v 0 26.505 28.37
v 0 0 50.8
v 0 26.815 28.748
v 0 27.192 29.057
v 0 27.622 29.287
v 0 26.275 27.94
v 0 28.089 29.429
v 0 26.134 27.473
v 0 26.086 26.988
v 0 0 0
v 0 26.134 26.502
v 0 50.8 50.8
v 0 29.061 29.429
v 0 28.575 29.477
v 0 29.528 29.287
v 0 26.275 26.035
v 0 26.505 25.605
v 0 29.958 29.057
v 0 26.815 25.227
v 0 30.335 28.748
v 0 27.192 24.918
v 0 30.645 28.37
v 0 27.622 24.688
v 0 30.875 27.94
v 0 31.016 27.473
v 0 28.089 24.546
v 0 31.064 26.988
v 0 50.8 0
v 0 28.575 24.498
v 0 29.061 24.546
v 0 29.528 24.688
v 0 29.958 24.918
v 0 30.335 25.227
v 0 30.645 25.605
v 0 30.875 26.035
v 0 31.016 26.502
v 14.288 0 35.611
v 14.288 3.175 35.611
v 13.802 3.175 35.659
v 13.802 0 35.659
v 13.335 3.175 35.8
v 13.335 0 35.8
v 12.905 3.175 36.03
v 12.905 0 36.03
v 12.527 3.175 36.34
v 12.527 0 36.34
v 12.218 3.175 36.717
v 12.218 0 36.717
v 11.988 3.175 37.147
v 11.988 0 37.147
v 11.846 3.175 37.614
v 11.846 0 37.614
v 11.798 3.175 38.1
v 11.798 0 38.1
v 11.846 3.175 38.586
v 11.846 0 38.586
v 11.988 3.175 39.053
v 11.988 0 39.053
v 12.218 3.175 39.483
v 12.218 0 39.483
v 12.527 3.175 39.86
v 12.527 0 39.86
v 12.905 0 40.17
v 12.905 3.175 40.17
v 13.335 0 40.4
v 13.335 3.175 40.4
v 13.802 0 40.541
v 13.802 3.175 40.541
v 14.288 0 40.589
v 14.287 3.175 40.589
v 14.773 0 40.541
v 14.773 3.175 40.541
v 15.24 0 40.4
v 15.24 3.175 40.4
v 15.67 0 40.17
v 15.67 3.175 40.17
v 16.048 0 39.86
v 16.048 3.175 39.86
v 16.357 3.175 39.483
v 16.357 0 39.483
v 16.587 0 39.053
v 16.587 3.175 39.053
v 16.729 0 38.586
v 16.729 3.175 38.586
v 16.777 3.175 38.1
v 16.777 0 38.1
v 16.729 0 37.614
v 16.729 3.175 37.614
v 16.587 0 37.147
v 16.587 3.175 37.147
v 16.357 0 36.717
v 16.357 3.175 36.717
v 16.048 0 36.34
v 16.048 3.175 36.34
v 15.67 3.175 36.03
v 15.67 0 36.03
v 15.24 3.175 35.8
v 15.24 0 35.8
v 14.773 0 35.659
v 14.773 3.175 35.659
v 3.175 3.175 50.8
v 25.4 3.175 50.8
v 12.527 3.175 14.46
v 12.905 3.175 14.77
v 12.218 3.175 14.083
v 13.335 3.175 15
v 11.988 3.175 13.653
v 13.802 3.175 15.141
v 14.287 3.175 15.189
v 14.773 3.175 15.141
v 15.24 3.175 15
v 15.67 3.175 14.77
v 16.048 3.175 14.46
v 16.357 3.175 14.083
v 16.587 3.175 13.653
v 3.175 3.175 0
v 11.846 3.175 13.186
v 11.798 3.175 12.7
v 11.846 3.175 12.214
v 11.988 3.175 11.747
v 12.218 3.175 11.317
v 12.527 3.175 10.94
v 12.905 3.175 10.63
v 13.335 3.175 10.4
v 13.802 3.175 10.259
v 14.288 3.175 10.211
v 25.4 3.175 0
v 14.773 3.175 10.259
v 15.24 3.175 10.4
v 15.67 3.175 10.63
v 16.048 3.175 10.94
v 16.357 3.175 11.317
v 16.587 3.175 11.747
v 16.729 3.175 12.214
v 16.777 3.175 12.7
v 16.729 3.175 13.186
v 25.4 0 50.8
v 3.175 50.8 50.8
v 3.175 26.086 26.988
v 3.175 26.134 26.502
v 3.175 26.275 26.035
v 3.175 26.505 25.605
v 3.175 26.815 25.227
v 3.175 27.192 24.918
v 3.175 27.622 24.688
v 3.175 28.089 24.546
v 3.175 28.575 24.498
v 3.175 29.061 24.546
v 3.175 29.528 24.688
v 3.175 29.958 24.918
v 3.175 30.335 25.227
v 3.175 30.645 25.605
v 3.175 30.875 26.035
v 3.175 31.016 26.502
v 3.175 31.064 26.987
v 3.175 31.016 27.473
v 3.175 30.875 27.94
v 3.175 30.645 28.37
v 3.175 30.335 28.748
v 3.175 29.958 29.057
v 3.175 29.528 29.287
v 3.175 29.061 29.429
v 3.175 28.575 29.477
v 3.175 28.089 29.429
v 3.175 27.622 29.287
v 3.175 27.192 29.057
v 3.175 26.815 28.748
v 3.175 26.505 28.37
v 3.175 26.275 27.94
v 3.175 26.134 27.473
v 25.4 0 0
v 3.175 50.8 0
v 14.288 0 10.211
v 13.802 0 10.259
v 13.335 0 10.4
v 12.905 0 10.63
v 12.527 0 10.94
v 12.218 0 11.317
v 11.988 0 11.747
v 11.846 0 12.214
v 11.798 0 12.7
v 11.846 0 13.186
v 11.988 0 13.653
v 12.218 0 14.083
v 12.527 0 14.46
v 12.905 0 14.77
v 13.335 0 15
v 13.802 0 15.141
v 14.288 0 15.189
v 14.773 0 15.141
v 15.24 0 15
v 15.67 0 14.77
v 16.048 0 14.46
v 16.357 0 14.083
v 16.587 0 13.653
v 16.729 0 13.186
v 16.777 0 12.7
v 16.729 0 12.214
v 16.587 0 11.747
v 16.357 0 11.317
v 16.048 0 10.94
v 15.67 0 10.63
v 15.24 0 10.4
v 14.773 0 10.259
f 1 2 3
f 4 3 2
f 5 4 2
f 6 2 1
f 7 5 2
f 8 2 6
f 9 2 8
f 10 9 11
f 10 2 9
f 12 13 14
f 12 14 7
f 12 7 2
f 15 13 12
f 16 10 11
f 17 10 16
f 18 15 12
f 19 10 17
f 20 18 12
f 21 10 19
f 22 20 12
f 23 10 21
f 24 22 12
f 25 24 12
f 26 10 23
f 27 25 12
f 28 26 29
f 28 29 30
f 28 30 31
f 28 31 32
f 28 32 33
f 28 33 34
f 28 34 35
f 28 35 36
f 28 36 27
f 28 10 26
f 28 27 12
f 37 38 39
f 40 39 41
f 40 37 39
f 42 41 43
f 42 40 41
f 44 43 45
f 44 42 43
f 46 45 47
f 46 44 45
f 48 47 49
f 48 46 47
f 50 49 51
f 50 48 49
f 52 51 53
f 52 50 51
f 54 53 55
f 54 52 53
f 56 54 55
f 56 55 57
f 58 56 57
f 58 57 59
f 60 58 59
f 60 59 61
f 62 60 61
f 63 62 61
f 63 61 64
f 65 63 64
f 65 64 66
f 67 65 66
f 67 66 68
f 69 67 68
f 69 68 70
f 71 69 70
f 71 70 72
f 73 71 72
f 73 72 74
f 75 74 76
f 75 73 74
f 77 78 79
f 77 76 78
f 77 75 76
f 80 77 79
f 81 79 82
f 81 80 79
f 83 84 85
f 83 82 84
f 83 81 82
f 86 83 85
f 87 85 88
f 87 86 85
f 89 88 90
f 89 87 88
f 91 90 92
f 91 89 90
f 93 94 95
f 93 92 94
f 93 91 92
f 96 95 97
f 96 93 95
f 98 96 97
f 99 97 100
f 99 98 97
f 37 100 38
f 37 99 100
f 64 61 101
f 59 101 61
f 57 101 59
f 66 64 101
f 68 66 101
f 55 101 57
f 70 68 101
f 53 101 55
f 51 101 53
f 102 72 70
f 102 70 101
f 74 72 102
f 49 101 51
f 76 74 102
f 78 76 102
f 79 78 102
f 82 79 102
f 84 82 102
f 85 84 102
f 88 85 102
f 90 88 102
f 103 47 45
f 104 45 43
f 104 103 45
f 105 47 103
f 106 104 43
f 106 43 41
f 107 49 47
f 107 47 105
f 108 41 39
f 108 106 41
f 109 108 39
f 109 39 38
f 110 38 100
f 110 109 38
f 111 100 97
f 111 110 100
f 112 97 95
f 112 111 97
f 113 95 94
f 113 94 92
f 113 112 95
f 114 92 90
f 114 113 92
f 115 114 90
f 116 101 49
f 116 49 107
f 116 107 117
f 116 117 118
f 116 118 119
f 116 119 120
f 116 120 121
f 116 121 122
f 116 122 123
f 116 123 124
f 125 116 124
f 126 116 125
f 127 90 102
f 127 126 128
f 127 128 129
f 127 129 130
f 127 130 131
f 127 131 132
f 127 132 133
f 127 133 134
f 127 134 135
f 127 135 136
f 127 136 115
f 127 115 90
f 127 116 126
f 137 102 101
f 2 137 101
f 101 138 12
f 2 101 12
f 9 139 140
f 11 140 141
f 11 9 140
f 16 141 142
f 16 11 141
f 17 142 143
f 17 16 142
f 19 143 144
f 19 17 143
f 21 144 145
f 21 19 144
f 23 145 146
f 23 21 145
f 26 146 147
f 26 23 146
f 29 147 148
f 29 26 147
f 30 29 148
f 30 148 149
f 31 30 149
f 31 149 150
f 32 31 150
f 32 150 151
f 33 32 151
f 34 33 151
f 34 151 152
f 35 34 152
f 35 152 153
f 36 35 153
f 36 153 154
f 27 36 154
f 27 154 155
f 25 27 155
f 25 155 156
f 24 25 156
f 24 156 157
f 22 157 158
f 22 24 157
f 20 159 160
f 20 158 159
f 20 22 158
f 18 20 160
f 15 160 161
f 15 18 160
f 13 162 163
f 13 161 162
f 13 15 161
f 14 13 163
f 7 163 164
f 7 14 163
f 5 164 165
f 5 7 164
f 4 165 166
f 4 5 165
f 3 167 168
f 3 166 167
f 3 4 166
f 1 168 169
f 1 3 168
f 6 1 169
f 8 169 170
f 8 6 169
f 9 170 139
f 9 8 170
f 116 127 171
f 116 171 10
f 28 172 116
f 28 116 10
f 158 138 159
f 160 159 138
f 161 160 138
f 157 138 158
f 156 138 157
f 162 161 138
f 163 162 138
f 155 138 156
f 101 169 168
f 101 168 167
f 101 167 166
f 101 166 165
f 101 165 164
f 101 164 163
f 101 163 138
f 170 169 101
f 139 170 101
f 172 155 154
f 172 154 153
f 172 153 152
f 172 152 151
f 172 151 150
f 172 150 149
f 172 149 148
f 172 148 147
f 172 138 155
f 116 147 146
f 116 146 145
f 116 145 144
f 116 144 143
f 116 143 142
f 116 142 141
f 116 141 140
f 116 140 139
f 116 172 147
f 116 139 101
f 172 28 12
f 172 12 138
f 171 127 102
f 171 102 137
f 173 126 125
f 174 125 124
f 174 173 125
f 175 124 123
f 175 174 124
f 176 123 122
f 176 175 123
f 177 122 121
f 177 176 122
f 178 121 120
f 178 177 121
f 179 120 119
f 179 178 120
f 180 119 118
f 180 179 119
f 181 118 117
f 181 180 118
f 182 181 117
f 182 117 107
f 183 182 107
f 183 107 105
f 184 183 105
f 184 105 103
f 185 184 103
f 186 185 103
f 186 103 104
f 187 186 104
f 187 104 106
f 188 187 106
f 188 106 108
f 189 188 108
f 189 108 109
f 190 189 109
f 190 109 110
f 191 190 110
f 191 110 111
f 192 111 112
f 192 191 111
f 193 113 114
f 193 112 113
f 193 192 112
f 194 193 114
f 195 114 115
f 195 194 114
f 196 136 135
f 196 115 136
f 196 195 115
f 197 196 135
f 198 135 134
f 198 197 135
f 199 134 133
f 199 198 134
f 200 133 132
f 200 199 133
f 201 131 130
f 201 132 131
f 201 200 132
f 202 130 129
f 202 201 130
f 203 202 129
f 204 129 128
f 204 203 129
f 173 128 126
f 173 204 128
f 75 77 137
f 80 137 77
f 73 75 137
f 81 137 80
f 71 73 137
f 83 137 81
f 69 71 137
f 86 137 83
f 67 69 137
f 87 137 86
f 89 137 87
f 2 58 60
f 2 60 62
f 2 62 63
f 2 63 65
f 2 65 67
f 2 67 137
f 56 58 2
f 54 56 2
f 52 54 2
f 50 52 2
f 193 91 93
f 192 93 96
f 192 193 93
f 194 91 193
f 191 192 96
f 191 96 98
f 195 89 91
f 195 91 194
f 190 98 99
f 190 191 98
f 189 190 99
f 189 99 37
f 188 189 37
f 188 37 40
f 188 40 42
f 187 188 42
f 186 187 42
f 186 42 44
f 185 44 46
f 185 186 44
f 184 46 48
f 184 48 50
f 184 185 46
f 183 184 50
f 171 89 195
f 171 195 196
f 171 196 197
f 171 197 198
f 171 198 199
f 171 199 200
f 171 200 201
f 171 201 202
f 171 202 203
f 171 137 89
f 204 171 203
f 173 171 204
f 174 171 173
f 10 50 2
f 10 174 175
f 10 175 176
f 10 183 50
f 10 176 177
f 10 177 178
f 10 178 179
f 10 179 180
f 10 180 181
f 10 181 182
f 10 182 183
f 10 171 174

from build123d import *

# Parameters (mm, degrees)
BOSS_EXTRUDE1_DEPTH = 50.8
SKETCH2_R           = 2.4892
CUT_EXTRUDE1_DEPTH  = 77.2
SKETCH3_R           = 2.4892
CUT_EXTRUDE2_DEPTH  = 77.2


with BuildPart() as part:
    # Sketch1 → Boss-Extrude1 (new body)
    with BuildSketch(Plane.XY):
        Polygon((0, 0), (0, 50.8), (3.175, 50.8), (3.175, 3.175), (25.4, 3.175), (25.4, 0), align=None)
    extrude(amount=BOSS_EXTRUDE1_DEPTH)

    # Sketch2 → Cut-Extrude1 (cut, through all)
    with BuildSketch(Plane(origin=(0, 0, 0), x_dir=(0, 0, -1), z_dir=(1, 0, 0))):
        with Locations(Location((-26.9875, 28.575, 0), (0, 0, 270))):
            Circle(SKETCH2_R)
    extrude(amount=CUT_EXTRUDE1_DEPTH, mode=Mode.SUBTRACT)

    # Sketch3 → Cut-Extrude2 (cut, through all)
    with BuildSketch(Plane(origin=(0, 0, 0), x_dir=(1, 0, 0), z_dir=(0, 1, 0))):
        with Locations(Location((14.2875, -38.1, 0), (0, 0, 90))):
            Circle(SKETCH3_R)
        with Locations(Location((14.2875, -12.7, 0), (0, 0, 90))):
            Circle(SKETCH3_R)
    extrude(amount=CUT_EXTRUDE2_DEPTH, mode=Mode.SUBTRACT)


solid = part.part
